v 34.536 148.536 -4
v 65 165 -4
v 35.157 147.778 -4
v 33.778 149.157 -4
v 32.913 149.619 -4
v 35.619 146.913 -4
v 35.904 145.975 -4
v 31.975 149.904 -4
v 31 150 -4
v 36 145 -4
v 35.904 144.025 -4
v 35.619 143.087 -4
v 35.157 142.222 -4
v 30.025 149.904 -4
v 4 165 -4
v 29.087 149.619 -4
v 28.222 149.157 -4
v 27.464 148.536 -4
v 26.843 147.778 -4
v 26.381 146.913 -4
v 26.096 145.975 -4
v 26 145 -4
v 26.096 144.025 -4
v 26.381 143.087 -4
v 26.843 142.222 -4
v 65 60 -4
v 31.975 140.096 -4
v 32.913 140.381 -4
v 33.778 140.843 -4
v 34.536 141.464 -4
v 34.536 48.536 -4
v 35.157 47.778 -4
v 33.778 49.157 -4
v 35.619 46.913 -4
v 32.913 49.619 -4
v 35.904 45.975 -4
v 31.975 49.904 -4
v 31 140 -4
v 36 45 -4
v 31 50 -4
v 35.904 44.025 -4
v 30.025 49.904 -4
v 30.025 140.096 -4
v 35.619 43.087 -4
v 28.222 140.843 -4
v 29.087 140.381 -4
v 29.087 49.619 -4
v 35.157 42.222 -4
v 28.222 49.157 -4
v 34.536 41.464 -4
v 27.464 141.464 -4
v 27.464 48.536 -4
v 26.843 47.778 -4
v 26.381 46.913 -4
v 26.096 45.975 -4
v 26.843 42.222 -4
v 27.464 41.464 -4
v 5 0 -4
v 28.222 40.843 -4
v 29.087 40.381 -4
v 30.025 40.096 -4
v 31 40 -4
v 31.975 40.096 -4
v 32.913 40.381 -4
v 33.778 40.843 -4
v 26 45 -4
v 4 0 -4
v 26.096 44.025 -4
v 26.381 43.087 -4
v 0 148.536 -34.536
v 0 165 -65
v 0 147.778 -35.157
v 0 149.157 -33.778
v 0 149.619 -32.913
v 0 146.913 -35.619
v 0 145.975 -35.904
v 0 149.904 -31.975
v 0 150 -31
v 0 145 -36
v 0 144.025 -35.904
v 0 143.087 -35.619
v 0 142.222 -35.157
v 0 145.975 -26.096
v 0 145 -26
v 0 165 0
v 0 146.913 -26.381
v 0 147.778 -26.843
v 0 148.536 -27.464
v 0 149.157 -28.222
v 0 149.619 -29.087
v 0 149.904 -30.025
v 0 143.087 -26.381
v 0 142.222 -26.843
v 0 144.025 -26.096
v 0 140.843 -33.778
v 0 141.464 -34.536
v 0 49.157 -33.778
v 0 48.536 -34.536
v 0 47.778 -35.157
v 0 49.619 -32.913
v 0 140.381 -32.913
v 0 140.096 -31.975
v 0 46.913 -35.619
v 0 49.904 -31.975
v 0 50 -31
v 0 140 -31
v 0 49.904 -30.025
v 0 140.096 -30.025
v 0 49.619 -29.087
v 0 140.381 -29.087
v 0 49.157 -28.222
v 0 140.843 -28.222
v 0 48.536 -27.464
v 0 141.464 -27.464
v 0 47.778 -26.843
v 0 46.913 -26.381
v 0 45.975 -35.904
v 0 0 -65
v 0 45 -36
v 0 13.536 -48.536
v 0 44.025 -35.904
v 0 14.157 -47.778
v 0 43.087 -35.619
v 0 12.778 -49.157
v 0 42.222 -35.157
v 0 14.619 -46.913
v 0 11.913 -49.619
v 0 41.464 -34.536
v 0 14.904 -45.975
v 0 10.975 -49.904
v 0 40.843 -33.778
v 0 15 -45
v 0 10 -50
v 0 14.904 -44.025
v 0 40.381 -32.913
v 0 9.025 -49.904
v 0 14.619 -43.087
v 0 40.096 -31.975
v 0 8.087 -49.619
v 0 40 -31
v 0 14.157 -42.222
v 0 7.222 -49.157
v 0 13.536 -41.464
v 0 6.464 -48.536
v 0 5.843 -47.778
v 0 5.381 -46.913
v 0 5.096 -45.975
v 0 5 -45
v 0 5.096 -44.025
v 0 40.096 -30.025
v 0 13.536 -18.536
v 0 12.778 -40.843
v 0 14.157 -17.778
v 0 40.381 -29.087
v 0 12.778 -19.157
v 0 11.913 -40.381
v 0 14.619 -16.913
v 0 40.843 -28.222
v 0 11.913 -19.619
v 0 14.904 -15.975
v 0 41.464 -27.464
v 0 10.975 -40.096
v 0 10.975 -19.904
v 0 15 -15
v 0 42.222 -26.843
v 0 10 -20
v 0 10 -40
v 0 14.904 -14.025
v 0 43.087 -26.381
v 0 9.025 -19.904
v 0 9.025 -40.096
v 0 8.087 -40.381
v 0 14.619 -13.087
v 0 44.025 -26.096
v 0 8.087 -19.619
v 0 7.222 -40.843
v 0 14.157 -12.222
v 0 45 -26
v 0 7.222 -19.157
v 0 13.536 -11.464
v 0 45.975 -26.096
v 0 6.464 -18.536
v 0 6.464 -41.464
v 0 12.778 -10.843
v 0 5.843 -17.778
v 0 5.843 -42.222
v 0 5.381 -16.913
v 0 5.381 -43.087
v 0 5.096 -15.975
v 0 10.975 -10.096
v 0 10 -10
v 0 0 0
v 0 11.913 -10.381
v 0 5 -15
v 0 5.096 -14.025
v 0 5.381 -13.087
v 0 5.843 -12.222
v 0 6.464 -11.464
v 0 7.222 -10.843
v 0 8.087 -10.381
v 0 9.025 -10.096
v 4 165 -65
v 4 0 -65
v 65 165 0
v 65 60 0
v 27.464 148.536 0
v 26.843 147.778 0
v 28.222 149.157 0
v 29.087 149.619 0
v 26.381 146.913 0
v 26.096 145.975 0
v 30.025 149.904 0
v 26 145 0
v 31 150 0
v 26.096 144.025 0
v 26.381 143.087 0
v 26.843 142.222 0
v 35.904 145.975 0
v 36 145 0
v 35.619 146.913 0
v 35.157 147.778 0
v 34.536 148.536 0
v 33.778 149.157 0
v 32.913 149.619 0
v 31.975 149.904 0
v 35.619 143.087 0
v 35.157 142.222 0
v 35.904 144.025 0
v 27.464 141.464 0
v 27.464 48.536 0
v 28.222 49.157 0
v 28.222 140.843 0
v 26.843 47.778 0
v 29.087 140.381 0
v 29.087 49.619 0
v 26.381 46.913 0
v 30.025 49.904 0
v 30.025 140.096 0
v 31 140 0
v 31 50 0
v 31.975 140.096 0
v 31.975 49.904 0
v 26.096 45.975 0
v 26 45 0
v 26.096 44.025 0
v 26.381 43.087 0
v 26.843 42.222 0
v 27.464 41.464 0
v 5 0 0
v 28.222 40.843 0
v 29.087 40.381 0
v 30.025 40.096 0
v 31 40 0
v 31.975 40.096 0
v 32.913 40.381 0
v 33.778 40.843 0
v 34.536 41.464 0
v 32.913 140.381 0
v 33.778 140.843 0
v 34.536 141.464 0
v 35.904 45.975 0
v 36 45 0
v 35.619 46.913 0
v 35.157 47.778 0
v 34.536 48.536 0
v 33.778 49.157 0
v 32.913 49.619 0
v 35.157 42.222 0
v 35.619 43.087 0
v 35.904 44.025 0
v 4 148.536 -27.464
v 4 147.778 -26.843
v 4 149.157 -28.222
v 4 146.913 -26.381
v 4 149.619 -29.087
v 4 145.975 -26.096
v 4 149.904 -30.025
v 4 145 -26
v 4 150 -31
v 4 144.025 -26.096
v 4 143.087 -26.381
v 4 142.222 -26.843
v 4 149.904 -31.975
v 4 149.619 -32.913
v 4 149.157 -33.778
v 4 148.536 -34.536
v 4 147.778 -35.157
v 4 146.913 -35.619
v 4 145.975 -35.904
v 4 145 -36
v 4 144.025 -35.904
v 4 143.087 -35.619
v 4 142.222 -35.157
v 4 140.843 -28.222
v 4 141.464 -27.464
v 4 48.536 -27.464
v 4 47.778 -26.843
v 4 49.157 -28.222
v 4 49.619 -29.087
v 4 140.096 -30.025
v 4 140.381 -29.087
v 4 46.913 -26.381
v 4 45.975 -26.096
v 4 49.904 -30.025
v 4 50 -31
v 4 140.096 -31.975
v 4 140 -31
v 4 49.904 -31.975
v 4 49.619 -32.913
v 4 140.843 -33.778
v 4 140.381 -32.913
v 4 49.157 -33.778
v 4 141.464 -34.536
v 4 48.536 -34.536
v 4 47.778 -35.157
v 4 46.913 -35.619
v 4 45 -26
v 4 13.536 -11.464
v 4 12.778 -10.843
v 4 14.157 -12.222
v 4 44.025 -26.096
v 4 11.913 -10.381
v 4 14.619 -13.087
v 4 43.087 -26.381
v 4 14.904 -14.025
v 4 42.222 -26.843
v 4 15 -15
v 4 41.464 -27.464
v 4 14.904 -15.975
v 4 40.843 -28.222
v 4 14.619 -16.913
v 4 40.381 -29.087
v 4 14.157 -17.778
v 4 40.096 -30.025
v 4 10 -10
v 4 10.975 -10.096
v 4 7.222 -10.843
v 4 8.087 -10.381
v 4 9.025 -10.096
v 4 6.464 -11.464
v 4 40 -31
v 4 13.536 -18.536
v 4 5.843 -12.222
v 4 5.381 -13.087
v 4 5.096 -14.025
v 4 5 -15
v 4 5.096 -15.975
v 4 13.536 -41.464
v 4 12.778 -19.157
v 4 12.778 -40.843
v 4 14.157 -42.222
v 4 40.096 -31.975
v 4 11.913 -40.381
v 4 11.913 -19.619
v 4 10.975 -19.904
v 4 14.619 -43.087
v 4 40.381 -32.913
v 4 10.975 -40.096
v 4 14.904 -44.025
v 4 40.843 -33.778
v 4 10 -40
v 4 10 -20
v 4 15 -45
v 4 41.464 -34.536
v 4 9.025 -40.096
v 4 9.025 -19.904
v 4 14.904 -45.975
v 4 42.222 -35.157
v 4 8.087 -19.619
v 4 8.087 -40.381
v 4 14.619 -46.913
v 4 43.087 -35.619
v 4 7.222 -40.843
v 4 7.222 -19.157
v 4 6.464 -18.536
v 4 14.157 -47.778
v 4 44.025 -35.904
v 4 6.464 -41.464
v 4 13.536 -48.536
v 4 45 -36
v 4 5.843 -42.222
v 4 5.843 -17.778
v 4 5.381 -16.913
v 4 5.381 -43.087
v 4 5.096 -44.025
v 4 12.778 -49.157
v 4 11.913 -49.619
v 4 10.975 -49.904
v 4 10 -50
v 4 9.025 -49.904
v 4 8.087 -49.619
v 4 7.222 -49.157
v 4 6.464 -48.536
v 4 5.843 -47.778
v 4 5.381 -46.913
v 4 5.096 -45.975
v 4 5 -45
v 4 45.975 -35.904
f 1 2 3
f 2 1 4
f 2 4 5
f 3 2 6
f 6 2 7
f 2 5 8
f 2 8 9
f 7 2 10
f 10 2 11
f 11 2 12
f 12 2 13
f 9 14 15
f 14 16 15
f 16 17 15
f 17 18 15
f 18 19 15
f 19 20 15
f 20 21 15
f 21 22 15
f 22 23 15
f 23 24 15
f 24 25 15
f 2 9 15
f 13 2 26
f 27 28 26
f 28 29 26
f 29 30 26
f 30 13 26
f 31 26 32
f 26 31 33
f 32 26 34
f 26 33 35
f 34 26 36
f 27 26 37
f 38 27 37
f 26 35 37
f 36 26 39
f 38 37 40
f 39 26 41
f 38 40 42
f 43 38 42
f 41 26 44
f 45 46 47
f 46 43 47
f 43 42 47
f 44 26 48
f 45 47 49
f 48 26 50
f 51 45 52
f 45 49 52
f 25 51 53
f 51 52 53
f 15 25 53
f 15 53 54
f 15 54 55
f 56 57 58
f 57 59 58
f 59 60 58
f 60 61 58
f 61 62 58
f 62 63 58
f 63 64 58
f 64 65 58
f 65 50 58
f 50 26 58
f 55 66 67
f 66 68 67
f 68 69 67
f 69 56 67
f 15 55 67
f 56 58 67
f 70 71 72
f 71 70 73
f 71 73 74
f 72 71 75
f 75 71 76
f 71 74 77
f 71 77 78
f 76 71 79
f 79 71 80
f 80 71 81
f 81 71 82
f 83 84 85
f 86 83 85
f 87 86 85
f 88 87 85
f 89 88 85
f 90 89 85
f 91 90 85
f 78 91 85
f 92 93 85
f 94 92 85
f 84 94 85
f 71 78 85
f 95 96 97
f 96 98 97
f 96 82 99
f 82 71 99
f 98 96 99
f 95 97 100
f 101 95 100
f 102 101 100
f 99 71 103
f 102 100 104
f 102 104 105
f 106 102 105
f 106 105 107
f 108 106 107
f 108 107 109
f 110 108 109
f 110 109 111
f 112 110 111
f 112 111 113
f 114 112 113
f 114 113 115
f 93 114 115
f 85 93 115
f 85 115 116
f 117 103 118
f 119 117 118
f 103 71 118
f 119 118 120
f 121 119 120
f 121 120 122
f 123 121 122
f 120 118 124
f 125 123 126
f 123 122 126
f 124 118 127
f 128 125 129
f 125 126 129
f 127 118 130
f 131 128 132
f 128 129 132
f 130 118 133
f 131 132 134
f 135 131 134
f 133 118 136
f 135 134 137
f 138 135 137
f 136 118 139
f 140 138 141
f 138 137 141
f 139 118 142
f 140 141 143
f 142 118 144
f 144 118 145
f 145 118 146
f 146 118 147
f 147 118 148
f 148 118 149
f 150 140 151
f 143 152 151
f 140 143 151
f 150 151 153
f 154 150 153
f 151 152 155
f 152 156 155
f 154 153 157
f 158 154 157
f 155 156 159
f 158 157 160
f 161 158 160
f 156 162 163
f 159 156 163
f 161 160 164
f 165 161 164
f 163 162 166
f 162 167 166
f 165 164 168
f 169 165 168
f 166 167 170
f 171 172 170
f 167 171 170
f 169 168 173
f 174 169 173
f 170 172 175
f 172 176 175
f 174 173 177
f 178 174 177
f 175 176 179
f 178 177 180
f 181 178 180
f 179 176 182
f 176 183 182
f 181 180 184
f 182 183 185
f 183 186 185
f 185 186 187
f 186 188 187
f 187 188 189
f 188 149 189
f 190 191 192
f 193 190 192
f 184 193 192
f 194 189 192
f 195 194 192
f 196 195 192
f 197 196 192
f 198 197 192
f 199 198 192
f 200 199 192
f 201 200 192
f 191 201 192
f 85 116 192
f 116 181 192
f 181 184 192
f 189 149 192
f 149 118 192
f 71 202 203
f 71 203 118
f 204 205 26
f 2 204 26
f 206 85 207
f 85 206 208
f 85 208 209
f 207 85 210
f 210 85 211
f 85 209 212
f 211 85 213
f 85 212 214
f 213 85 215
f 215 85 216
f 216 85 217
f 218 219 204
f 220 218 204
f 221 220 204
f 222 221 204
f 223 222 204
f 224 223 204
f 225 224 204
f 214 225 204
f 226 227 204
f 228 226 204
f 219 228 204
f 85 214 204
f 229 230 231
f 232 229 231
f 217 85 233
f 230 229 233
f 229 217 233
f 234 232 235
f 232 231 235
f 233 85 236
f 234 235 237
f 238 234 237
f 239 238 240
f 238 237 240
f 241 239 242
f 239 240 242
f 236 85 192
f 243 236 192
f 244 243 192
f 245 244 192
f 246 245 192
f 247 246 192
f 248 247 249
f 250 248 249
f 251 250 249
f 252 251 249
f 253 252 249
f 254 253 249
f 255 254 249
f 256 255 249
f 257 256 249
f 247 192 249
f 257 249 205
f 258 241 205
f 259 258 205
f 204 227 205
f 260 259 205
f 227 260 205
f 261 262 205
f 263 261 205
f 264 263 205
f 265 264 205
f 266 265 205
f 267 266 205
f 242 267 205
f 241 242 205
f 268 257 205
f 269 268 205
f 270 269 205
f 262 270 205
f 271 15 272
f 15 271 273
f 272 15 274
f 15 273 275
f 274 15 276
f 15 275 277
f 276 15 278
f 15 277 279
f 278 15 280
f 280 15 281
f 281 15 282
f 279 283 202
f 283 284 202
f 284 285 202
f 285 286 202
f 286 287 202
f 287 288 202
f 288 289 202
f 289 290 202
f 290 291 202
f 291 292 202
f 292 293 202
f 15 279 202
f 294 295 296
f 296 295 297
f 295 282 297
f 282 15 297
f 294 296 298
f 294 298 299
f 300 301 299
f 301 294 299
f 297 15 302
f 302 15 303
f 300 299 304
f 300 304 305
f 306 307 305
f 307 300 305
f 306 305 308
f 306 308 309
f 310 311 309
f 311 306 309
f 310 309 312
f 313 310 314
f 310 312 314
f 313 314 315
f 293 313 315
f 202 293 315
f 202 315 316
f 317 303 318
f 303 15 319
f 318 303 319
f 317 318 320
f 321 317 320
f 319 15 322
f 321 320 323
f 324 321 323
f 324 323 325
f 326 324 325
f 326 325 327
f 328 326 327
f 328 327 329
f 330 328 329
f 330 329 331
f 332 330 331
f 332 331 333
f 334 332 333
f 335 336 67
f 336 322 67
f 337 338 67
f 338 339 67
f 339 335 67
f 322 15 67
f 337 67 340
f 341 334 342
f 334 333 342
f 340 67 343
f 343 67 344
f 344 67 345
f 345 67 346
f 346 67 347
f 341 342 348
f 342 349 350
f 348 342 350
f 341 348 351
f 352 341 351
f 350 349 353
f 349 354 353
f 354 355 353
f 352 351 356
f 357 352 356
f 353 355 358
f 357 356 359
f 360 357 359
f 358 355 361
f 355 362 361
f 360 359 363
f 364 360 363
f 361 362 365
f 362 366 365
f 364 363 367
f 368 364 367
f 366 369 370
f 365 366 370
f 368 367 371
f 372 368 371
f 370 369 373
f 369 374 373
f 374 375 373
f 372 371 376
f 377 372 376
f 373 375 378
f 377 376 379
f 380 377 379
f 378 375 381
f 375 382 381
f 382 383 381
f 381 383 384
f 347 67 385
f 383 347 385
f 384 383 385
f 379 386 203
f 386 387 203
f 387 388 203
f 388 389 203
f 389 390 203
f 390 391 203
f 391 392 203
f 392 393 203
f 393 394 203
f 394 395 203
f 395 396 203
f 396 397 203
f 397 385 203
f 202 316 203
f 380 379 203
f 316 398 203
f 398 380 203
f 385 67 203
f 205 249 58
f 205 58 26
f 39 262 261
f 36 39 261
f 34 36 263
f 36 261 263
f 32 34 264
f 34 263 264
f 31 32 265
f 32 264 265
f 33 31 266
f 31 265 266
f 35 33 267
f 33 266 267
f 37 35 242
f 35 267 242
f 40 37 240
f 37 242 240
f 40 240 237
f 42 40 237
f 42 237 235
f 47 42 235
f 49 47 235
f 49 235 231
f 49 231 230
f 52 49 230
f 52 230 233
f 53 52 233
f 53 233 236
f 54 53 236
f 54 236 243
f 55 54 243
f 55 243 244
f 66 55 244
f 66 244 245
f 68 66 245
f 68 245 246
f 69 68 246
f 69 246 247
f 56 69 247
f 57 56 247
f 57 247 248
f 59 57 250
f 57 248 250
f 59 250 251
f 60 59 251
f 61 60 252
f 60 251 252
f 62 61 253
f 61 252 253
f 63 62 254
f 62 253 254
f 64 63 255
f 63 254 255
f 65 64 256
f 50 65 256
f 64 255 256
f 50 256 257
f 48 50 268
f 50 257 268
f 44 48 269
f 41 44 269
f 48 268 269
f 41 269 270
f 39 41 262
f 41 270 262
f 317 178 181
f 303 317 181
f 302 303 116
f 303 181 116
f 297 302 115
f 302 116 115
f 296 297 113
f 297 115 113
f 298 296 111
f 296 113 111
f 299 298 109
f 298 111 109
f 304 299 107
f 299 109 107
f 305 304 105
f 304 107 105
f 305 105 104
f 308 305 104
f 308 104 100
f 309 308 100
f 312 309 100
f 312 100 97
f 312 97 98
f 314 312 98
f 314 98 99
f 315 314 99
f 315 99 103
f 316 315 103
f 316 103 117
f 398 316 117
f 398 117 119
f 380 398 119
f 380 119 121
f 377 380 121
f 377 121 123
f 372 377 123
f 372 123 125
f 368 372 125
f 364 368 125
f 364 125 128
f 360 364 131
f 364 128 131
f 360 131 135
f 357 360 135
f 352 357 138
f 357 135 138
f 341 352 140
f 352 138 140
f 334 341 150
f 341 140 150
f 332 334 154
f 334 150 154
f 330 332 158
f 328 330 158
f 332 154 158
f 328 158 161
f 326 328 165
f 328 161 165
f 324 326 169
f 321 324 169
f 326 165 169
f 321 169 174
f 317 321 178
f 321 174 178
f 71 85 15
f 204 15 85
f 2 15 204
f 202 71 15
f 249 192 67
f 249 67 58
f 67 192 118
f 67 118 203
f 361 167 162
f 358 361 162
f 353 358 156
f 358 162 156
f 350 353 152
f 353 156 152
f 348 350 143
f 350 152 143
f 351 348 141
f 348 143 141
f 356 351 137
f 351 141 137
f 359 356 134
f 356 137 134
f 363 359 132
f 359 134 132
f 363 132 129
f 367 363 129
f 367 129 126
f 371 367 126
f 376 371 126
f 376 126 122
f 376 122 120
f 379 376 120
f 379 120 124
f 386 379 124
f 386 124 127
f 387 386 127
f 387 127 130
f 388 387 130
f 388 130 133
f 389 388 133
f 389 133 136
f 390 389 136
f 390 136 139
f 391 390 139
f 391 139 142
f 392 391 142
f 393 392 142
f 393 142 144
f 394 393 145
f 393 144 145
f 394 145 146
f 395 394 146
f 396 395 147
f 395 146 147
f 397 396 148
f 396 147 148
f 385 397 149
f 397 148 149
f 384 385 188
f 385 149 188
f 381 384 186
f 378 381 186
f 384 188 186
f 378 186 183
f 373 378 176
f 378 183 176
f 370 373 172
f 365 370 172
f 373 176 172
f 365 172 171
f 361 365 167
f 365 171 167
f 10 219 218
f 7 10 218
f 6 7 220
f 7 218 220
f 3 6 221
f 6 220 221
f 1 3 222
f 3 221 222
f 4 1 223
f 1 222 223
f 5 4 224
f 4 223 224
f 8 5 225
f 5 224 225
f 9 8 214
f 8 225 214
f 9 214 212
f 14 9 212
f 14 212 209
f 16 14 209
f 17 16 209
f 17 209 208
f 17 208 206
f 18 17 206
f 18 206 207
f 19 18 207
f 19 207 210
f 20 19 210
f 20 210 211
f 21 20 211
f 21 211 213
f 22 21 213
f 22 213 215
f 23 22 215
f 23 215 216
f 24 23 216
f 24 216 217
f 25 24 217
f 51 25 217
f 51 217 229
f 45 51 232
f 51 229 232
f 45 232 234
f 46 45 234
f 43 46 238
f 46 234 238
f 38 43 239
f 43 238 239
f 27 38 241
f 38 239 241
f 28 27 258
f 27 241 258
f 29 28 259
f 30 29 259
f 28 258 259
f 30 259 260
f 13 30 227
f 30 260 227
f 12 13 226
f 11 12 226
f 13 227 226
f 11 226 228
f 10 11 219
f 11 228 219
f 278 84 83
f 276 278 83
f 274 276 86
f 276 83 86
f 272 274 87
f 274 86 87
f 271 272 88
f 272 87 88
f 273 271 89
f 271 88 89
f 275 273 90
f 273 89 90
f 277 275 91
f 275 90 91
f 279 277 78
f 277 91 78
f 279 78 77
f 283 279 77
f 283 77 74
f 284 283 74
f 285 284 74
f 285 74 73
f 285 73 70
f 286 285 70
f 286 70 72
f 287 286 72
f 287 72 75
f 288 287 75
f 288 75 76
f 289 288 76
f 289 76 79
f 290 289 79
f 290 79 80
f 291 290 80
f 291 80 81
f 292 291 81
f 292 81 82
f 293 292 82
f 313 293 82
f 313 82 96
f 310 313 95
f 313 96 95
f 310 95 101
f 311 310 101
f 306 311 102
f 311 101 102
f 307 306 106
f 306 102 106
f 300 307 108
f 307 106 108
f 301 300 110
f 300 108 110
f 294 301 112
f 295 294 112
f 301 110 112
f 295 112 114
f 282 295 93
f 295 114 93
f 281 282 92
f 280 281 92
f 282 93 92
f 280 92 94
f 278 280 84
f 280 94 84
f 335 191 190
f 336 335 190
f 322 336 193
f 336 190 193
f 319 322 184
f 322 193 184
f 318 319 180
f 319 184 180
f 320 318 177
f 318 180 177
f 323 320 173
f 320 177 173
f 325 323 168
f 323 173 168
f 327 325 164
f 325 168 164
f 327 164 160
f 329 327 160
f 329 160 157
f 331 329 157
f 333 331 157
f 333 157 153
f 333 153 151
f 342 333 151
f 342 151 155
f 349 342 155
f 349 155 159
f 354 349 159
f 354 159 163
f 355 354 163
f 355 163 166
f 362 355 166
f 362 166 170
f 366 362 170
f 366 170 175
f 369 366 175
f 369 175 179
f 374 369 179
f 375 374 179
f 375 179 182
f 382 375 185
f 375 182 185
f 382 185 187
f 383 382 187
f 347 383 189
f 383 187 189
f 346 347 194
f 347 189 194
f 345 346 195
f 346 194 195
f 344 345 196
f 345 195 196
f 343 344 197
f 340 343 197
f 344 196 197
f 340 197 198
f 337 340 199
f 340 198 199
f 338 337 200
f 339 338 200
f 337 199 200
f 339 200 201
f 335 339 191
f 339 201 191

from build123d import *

# Parameters (mm, degrees)
EXTRUDE_1_DEPTH     = 165
SKETCH_2_R          = 5
CUT_EXTRUDE_1_DEPTH = 10
SKETCH_3_R          = 5
CUT_EXTRUDE_2_DEPTH = 10
CUT_EXTRUDE_3_DEPTH = 66


with BuildPart() as part:
    # Эскиз1 → Вытянуть-Тонкостенный1 (new body)
    with BuildSketch(Plane(origin=(0, 0, 0), x_dir=(1, 0, 0), z_dir=(0, 1, 0))):
        Polygon((0, 65), (0, 0), (65, 0), (65, 4), (4, 4), (4, 65), align=None)
    extrude(amount=EXTRUDE_1_DEPTH)

    # Эскиз2 → Вырез-Вытянуть1 (cut)
    with BuildSketch(Plane.XY):
        with Locations((31, 145)):
            Circle(SKETCH_2_R)
        with Locations((31, 45)):
            Circle(SKETCH_2_R)
    extrude(amount=-CUT_EXTRUDE_1_DEPTH, mode=Mode.SUBTRACT)

    # Эскиз3 → Вырез-Вытянуть2 (cut)
    with BuildSketch(Plane.ZY):
        with Locations((-31, 145)):
            Circle(SKETCH_3_R)
        with Locations((-31, 45)):
            Circle(SKETCH_3_R)
        with Locations((-15, 10)):
            Circle(SKETCH_3_R)
        with Locations((-45, 10)):
            Circle(SKETCH_3_R)
    extrude(amount=-CUT_EXTRUDE_2_DEPTH, mode=Mode.SUBTRACT)

    # Эскиз4 → Вырез-Вытянуть3 (cut, through all)
    with BuildSketch(Plane.XY):
        Polygon((5, 0), (65, 60), (65, 0), align=None)
    extrude(amount=-CUT_EXTRUDE_3_DEPTH, mode=Mode.SUBTRACT)


solid = part.part
